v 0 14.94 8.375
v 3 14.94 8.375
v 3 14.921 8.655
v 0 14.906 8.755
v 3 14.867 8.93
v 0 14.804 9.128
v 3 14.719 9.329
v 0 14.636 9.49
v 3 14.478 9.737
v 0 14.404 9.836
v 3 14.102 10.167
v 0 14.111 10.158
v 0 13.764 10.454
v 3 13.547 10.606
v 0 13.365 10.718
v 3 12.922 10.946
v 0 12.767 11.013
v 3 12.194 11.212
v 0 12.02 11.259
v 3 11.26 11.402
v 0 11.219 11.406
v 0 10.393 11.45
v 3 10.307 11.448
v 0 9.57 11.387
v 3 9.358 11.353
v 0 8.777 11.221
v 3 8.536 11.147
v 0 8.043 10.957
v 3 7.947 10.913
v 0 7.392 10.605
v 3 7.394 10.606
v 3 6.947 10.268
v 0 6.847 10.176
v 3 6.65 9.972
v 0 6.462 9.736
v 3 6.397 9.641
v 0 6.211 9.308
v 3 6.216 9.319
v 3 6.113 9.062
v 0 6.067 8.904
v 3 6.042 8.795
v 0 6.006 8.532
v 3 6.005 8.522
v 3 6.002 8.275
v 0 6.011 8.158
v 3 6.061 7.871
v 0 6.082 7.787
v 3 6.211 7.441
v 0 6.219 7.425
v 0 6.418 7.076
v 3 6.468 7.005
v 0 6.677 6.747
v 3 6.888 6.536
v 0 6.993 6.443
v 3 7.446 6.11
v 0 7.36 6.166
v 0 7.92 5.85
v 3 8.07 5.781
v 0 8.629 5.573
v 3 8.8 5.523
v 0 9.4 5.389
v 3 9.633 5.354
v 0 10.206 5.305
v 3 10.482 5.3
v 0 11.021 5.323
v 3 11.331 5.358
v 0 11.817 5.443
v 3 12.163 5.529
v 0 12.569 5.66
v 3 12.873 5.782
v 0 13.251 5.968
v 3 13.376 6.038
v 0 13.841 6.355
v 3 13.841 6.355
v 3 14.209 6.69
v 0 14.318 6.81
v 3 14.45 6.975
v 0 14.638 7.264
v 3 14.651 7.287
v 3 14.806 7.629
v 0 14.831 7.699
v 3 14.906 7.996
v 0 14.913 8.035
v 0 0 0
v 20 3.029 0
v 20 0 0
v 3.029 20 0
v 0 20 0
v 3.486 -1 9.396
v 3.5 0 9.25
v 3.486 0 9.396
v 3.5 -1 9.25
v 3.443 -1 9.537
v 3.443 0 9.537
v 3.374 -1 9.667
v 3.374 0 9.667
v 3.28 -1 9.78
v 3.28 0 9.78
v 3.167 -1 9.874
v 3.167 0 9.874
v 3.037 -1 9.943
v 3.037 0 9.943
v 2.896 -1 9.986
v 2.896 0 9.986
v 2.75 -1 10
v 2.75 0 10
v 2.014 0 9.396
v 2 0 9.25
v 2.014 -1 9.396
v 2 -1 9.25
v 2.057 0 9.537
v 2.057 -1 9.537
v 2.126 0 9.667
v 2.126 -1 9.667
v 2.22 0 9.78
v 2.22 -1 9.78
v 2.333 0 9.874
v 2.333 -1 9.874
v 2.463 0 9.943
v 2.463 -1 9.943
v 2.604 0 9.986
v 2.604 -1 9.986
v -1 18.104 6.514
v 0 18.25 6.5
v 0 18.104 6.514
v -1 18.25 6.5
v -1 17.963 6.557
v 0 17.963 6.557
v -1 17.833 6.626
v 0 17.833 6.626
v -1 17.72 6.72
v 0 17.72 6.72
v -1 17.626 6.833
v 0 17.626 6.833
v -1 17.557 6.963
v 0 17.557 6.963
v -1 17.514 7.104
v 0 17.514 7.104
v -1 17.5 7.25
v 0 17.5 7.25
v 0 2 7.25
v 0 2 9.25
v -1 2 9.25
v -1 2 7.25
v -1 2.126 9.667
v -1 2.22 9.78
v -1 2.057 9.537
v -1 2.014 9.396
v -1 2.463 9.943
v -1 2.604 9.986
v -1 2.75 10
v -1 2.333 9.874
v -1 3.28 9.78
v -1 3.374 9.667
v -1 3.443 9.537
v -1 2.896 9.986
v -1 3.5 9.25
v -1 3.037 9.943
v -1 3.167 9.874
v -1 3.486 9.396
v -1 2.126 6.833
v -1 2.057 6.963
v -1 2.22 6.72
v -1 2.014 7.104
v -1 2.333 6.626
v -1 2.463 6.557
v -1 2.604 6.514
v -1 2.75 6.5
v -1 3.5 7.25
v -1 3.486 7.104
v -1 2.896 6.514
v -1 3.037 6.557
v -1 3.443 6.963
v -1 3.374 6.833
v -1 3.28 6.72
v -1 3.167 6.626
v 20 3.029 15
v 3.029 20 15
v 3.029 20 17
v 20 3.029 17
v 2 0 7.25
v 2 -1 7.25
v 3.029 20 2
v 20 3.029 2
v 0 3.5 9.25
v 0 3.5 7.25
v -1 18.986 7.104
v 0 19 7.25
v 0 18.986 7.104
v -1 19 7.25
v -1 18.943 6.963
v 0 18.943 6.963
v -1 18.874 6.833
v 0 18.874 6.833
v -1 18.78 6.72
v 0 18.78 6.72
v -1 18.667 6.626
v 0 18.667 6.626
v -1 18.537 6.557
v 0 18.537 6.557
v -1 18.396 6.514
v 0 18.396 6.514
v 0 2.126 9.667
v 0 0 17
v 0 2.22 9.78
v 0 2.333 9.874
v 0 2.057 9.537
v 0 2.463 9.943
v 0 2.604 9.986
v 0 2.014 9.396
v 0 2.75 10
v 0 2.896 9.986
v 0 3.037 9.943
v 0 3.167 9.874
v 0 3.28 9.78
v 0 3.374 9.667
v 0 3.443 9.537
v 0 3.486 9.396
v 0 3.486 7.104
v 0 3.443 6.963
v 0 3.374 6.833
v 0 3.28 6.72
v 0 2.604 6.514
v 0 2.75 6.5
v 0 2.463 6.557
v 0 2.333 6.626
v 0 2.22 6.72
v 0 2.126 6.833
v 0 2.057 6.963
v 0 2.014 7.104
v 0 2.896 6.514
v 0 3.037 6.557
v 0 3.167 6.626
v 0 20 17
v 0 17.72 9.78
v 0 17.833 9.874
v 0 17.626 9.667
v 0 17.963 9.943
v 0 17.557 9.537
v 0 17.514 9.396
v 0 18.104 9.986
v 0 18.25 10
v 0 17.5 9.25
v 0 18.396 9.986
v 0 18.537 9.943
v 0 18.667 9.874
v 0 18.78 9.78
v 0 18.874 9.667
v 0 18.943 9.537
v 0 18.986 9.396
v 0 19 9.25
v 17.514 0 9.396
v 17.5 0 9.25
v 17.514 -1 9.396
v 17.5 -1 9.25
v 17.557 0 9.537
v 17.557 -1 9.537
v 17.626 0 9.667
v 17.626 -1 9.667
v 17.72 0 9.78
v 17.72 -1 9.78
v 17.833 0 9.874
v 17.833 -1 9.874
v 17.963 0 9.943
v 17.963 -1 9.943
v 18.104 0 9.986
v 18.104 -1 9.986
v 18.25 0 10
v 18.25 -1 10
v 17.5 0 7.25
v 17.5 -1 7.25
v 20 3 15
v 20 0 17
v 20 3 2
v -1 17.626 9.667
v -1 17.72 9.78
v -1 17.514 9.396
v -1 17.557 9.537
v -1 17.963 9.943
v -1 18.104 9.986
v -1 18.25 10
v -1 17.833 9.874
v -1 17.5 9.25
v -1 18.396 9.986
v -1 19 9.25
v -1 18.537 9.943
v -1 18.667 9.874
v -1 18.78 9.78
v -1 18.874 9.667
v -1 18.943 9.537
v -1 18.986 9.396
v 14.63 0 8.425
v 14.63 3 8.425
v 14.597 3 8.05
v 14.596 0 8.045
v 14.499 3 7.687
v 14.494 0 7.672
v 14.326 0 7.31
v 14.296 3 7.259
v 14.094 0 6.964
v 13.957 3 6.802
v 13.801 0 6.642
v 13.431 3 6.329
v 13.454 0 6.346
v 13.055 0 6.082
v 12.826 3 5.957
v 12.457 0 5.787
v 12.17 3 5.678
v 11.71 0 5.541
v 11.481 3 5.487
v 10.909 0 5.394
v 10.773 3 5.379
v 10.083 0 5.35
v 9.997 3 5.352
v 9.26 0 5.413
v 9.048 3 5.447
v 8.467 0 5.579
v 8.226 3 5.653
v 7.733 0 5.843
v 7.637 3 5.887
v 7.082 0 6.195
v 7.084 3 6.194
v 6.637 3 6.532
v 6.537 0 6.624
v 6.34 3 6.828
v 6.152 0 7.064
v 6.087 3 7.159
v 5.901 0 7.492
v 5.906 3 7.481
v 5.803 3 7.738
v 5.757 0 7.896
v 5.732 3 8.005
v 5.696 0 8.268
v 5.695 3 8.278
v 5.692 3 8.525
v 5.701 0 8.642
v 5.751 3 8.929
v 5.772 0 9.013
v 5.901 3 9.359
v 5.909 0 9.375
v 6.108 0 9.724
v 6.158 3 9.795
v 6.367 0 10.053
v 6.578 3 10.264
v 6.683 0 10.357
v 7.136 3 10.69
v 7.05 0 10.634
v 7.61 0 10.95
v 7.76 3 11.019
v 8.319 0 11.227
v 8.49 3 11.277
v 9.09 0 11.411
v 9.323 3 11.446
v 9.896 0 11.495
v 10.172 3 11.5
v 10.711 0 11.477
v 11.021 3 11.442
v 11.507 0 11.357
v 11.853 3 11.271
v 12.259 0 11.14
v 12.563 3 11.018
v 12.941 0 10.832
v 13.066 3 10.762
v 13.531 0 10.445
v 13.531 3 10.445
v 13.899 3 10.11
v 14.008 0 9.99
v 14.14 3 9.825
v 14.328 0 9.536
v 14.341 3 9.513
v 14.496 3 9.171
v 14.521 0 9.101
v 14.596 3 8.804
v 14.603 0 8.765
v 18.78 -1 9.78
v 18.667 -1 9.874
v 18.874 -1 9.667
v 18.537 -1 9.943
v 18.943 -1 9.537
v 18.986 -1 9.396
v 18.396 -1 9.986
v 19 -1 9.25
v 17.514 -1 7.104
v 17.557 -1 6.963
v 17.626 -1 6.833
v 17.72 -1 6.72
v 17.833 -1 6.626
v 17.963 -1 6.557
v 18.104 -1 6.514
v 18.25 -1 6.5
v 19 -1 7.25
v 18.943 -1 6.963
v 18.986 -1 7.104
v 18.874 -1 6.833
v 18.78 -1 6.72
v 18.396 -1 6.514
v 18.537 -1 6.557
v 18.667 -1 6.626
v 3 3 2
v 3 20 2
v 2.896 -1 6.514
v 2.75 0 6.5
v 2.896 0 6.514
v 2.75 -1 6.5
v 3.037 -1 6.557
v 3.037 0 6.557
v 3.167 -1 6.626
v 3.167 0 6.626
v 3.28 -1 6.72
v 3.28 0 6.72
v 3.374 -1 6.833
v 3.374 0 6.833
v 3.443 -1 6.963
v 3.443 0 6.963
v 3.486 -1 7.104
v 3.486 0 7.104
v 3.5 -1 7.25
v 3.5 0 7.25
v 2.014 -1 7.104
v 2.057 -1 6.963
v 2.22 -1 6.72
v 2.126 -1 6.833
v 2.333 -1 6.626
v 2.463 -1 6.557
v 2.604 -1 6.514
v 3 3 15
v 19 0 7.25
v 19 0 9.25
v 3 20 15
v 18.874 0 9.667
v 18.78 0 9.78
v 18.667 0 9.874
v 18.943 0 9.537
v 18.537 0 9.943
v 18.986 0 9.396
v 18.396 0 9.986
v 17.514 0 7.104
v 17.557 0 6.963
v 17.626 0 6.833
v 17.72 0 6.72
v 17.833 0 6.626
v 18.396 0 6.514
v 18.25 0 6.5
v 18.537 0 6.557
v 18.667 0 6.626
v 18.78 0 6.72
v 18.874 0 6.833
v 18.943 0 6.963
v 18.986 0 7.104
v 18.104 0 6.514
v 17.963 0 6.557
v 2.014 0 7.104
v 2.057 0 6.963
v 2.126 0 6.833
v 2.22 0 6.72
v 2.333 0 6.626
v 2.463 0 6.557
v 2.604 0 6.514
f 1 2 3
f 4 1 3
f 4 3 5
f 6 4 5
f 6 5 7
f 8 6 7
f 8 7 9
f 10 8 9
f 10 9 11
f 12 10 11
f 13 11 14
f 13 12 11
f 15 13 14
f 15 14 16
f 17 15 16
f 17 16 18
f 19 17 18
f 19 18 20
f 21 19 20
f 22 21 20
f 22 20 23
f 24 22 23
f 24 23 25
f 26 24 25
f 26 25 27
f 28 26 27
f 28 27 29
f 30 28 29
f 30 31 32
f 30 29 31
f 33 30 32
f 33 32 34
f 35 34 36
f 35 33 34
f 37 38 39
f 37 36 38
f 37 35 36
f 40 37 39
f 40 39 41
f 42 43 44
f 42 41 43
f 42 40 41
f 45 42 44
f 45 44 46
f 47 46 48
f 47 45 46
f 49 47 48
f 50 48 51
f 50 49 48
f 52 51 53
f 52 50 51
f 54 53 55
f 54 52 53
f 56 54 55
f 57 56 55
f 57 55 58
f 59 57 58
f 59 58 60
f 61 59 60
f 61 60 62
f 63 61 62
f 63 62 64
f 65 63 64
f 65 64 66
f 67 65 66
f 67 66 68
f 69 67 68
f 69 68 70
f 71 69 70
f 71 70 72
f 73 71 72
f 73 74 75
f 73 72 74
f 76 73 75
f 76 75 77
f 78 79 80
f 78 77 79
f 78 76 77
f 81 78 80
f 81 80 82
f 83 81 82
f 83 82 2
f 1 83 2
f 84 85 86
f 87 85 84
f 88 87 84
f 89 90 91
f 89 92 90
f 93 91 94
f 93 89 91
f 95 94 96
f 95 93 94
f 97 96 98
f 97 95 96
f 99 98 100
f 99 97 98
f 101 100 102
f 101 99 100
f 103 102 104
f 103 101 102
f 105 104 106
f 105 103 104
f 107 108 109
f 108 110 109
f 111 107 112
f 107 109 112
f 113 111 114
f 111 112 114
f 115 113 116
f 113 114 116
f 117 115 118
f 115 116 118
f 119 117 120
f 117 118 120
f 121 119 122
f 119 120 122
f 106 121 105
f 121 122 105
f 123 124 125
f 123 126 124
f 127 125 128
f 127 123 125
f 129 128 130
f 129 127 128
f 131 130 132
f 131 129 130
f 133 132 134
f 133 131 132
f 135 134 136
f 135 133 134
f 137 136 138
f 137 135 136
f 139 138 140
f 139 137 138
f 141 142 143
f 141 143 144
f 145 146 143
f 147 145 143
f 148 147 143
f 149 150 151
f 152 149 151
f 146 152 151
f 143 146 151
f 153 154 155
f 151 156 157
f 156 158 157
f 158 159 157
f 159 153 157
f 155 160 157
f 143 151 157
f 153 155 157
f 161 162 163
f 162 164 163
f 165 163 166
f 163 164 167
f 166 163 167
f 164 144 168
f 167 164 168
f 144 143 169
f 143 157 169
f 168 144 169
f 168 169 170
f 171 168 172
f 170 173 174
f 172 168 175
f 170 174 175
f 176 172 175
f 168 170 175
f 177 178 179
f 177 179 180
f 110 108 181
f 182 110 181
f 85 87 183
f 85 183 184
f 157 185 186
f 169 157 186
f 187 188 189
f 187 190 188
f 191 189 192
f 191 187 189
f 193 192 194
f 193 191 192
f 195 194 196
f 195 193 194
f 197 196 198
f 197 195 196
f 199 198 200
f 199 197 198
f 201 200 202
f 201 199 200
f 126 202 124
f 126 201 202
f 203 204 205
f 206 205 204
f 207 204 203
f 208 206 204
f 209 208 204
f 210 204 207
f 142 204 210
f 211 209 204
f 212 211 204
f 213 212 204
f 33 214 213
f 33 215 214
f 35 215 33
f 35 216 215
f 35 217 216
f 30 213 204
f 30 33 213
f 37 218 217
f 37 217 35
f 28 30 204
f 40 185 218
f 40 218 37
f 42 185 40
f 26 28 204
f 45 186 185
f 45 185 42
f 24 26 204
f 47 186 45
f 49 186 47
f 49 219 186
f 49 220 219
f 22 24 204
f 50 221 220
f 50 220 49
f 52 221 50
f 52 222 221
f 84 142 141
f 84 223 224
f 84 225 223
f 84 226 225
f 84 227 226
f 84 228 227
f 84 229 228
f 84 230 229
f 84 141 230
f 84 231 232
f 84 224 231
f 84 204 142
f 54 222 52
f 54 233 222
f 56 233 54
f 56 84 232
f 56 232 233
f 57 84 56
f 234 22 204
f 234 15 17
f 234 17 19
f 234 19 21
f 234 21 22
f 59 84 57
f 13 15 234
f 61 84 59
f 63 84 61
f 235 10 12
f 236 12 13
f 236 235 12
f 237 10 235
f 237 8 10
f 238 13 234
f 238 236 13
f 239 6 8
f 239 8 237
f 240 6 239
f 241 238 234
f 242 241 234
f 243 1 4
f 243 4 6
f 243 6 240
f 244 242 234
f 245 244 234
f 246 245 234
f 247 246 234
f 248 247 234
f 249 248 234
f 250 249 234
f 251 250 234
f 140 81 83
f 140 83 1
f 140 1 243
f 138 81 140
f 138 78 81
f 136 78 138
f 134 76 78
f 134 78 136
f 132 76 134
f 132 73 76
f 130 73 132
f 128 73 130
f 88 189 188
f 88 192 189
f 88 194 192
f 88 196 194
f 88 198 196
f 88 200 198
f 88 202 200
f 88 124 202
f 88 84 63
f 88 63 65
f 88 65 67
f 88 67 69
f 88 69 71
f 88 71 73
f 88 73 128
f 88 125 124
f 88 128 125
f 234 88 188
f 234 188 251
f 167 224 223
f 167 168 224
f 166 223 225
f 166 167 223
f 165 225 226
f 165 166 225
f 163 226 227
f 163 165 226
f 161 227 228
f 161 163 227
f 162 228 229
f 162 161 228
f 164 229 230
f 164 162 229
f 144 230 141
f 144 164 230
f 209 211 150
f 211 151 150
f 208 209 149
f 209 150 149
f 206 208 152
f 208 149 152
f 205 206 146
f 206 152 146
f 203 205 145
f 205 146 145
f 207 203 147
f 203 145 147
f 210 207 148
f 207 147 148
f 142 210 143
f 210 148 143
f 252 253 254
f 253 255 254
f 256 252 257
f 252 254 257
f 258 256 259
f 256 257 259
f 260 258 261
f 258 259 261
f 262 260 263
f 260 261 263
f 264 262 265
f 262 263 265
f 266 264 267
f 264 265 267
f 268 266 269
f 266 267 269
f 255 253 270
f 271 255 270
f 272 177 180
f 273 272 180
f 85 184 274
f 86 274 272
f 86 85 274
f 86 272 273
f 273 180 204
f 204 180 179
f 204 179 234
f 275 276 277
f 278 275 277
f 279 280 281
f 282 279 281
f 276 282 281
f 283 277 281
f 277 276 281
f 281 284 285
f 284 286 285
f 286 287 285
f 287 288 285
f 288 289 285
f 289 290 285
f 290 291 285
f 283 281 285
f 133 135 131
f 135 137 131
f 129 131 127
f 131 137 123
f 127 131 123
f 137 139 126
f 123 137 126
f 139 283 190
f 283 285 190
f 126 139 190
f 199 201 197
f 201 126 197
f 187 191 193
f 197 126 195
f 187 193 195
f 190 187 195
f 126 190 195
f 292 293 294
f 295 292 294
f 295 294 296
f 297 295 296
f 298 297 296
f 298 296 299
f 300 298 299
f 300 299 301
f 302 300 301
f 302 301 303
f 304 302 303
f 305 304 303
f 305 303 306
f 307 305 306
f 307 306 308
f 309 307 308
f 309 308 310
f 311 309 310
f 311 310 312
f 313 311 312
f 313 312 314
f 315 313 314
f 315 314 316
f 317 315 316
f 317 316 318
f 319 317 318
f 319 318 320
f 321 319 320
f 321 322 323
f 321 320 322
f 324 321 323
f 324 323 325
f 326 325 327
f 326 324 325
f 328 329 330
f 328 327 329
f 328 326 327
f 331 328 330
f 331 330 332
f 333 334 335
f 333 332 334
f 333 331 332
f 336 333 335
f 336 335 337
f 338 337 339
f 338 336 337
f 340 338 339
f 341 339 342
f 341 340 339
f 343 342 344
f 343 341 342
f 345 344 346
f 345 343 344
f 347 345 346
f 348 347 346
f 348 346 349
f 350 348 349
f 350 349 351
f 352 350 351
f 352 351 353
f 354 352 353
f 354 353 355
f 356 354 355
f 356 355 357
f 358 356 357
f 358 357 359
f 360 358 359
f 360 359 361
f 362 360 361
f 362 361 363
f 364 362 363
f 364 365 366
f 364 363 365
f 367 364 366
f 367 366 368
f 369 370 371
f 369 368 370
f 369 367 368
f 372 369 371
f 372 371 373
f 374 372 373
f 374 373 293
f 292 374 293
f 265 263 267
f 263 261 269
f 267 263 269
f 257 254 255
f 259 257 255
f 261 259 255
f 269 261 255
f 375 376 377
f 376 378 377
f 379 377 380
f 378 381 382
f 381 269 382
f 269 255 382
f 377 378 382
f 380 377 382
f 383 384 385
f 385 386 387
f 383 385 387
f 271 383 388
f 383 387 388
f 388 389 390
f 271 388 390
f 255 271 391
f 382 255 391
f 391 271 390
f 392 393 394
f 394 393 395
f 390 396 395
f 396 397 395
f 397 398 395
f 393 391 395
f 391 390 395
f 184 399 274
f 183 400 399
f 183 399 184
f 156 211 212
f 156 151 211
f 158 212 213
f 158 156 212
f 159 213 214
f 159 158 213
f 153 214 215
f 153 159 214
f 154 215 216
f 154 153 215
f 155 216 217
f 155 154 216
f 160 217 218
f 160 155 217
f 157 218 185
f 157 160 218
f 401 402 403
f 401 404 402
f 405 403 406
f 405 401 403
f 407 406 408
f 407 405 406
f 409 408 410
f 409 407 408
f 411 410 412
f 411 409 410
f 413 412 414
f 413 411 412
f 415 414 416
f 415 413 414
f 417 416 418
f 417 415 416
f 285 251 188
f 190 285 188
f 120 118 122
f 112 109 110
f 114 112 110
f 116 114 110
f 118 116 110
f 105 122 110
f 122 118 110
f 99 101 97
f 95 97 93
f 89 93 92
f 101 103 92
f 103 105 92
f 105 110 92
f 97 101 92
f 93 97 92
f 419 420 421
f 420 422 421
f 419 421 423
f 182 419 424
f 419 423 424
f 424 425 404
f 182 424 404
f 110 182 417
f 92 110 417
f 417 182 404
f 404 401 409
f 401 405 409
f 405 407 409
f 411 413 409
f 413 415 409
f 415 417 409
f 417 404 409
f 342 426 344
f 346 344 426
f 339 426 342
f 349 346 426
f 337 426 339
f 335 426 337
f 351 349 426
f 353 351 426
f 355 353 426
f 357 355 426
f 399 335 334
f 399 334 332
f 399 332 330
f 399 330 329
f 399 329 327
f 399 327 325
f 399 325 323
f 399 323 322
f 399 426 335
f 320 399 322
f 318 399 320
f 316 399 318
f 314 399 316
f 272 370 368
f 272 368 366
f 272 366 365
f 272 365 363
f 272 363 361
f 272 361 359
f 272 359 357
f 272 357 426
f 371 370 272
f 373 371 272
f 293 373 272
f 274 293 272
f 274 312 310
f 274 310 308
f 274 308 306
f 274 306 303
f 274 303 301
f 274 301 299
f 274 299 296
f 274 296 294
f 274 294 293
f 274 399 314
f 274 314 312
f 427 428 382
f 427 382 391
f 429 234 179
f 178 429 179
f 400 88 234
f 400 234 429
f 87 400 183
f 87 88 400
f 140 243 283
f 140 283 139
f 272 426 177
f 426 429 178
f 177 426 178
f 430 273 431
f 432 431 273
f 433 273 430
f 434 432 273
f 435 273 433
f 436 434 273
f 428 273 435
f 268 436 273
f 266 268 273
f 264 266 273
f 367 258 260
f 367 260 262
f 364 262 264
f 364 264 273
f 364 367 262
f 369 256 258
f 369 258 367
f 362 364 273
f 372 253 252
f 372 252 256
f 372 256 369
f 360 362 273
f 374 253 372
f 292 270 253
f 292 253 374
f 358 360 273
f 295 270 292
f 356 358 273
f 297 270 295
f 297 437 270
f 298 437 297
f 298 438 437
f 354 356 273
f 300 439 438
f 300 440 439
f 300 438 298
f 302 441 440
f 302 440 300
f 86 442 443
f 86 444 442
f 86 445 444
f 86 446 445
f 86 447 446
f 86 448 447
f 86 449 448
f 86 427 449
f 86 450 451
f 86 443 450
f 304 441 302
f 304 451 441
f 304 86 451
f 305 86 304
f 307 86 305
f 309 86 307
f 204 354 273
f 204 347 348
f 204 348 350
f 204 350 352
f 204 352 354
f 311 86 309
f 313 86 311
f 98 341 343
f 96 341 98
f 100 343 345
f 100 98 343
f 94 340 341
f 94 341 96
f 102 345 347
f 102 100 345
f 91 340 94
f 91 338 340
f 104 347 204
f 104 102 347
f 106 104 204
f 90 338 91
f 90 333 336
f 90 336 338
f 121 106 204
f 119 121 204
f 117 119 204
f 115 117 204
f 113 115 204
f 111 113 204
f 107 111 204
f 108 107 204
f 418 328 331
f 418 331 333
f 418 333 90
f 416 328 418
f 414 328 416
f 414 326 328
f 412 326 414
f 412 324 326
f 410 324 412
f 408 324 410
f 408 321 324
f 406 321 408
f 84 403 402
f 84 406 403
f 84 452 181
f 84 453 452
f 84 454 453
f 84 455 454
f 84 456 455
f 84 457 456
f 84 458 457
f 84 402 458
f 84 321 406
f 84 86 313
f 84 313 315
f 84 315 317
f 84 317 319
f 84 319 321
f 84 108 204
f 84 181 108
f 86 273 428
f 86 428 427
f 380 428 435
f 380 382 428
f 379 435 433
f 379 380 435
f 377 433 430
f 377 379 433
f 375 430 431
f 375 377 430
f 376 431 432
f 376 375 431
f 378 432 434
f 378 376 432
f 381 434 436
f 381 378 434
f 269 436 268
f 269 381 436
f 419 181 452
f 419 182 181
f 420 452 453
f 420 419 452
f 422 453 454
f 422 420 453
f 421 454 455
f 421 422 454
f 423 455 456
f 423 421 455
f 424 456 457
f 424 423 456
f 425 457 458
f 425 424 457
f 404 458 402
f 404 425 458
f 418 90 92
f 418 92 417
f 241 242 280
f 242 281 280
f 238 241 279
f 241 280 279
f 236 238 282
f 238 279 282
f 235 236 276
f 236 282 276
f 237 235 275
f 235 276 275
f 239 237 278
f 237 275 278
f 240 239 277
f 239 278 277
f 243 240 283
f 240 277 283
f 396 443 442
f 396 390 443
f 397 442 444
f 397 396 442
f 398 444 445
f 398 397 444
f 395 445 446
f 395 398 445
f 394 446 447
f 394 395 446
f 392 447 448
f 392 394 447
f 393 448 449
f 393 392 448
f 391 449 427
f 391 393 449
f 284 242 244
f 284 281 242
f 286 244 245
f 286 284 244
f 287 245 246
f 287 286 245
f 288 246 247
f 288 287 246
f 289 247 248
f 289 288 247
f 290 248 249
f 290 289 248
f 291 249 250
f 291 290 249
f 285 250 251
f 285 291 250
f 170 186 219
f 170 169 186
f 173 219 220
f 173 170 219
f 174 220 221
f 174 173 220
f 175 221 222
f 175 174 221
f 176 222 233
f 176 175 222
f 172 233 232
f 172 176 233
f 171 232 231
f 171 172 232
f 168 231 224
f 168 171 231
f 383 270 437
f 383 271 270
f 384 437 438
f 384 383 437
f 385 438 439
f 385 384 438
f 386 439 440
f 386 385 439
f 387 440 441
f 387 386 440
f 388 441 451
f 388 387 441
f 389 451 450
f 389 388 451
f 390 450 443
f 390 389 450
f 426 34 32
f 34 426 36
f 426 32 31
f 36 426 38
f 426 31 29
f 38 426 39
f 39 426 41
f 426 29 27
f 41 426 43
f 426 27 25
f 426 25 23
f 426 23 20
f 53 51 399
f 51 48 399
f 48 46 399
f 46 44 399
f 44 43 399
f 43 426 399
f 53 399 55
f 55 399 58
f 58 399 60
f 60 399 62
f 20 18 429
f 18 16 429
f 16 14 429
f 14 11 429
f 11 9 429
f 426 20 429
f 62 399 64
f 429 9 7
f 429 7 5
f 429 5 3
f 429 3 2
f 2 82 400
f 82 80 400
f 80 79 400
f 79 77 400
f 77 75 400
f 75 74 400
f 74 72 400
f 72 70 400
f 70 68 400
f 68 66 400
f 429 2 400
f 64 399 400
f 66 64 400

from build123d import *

# Parameters (mm, degrees)
BOSS_EXTRUDE1_DEPTH = 17
SKETCH2_W           = 17
SKETCH2_H           = 17
CUT_EXTRUDE1_DEPTH  = 13
SKETCH3_RX          = 4.47
SKETCH3_RY          = 3.075
CUT_EXTRUDE2_DEPTH  = 13
SKETCH5_RX          = 4.47
SKETCH5_RY          = 3.075
CUT_EXTRUDE3_DEPTH  = 13
SKETCH6_W           = 3.5
SKETCH6_H           = 1.5
BOSS_EXTRUDE2_DEPTH = 1
FILLET1_R           = 0.75
SKETCH7_W           = 1.5
SKETCH7_H           = 3.5
BOSS_EXTRUDE3_DEPTH = 1
FILLET2_R           = 0.75


with BuildPart() as part:
    # Sketch1 → Boss-Extrude1 (new body)
    with BuildSketch(Plane.XY):
        Polygon((0, 0), (0, 20), (3.029437252, 20), (20, 3.029437252), (20, 0), align=None)
    extrude(amount=BOSS_EXTRUDE1_DEPTH)

    # Sketch2 → Cut-Extrude1 (cut)
    with BuildSketch(Plane.XY.offset(2)):
        with Locations((11.5, 11.5)):
            Rectangle(SKETCH2_W, SKETCH2_H)
    extrude(amount=CUT_EXTRUDE1_DEPTH, mode=Mode.SUBTRACT)

    # Sketch3 → Cut-Extrude2 (cut)
    with BuildSketch(Plane(origin=(0, 0, 0), x_dir=(1, 0, 0), z_dir=(0, 1, 0))):
        with Locations((10.16, -8.425)):
            Ellipse(SKETCH3_RX, SKETCH3_RY)
    extrude(amount=CUT_EXTRUDE2_DEPTH, mode=Mode.SUBTRACT)

    # Sketch5 → Cut-Extrude3 (cut)
    with BuildSketch(Plane(origin=(0, 0, 0), x_dir=(0, 0, -1), z_dir=(1, 0, 0))):
        with Locations(Location((-8.375, 10.47), (0, 0, 90))):
            Ellipse(SKETCH5_RX, SKETCH5_RY)
    extrude(amount=CUT_EXTRUDE3_DEPTH, mode=Mode.SUBTRACT)

    # Sketch6 → Boss-Extrude2 (add)
    with BuildSketch(Plane(origin=(0, 0, 0), x_dir=(0, 0, -1), z_dir=(1, 0, 0))):
        with Locations((-8.25, 18.25)):
            Rectangle(SKETCH6_W, SKETCH6_H)
        with Locations((-8.25, 2.75)):
            Rectangle(SKETCH6_W, SKETCH6_H)
    extrude(amount=-BOSS_EXTRUDE2_DEPTH)

    # Fillet1
    fillet1_edges = [part.edges().sort_by_distance(p)[0] for p in [
        (-0.5, 2, 6.5),
        (-0.5, 17.5, 6.5),
        (-0.5, 2, 10),
        (-0.5, 3.5, 10),
        (-0.5, 3.5, 6.5),
        (-0.5, 17.5, 10),
        (-0.5, 19, 10),
        (-0.5, 19, 6.5),
    ]]
    fillet(fillet1_edges, radius=FILLET1_R - 0.0001)  # a hair under: the kernel refuses the full size

    # Sketch7 → Boss-Extrude3 (add)
    with BuildSketch(Plane(origin=(0, 0, 0), x_dir=(1, 0, 0), z_dir=(0, 1, 0))):
        with Locations((2.75, -8.25)):
            Rectangle(SKETCH7_W, SKETCH7_H)
        with Locations((18.25, -8.25)):
            Rectangle(SKETCH7_W, SKETCH7_H)
    extrude(amount=-BOSS_EXTRUDE3_DEPTH)

    # Fillet2
    fillet2_edges = [part.edges().sort_by_distance(p)[0] for p in [
        (3.5, -0.5, 6.5),
        (2, -0.5, 6.5),
        (2, -0.5, 10),
        (3.5, -0.5, 10),
        (17.5, -0.5, 10),
        (19, -0.5, 10),
        (17.5, -0.5, 6.5),
        (19, -0.5, 6.5),
    ]]
    fillet(fillet2_edges, radius=FILLET2_R - 0.0001)  # a hair under: the kernel refuses the full size


solid = part.part
